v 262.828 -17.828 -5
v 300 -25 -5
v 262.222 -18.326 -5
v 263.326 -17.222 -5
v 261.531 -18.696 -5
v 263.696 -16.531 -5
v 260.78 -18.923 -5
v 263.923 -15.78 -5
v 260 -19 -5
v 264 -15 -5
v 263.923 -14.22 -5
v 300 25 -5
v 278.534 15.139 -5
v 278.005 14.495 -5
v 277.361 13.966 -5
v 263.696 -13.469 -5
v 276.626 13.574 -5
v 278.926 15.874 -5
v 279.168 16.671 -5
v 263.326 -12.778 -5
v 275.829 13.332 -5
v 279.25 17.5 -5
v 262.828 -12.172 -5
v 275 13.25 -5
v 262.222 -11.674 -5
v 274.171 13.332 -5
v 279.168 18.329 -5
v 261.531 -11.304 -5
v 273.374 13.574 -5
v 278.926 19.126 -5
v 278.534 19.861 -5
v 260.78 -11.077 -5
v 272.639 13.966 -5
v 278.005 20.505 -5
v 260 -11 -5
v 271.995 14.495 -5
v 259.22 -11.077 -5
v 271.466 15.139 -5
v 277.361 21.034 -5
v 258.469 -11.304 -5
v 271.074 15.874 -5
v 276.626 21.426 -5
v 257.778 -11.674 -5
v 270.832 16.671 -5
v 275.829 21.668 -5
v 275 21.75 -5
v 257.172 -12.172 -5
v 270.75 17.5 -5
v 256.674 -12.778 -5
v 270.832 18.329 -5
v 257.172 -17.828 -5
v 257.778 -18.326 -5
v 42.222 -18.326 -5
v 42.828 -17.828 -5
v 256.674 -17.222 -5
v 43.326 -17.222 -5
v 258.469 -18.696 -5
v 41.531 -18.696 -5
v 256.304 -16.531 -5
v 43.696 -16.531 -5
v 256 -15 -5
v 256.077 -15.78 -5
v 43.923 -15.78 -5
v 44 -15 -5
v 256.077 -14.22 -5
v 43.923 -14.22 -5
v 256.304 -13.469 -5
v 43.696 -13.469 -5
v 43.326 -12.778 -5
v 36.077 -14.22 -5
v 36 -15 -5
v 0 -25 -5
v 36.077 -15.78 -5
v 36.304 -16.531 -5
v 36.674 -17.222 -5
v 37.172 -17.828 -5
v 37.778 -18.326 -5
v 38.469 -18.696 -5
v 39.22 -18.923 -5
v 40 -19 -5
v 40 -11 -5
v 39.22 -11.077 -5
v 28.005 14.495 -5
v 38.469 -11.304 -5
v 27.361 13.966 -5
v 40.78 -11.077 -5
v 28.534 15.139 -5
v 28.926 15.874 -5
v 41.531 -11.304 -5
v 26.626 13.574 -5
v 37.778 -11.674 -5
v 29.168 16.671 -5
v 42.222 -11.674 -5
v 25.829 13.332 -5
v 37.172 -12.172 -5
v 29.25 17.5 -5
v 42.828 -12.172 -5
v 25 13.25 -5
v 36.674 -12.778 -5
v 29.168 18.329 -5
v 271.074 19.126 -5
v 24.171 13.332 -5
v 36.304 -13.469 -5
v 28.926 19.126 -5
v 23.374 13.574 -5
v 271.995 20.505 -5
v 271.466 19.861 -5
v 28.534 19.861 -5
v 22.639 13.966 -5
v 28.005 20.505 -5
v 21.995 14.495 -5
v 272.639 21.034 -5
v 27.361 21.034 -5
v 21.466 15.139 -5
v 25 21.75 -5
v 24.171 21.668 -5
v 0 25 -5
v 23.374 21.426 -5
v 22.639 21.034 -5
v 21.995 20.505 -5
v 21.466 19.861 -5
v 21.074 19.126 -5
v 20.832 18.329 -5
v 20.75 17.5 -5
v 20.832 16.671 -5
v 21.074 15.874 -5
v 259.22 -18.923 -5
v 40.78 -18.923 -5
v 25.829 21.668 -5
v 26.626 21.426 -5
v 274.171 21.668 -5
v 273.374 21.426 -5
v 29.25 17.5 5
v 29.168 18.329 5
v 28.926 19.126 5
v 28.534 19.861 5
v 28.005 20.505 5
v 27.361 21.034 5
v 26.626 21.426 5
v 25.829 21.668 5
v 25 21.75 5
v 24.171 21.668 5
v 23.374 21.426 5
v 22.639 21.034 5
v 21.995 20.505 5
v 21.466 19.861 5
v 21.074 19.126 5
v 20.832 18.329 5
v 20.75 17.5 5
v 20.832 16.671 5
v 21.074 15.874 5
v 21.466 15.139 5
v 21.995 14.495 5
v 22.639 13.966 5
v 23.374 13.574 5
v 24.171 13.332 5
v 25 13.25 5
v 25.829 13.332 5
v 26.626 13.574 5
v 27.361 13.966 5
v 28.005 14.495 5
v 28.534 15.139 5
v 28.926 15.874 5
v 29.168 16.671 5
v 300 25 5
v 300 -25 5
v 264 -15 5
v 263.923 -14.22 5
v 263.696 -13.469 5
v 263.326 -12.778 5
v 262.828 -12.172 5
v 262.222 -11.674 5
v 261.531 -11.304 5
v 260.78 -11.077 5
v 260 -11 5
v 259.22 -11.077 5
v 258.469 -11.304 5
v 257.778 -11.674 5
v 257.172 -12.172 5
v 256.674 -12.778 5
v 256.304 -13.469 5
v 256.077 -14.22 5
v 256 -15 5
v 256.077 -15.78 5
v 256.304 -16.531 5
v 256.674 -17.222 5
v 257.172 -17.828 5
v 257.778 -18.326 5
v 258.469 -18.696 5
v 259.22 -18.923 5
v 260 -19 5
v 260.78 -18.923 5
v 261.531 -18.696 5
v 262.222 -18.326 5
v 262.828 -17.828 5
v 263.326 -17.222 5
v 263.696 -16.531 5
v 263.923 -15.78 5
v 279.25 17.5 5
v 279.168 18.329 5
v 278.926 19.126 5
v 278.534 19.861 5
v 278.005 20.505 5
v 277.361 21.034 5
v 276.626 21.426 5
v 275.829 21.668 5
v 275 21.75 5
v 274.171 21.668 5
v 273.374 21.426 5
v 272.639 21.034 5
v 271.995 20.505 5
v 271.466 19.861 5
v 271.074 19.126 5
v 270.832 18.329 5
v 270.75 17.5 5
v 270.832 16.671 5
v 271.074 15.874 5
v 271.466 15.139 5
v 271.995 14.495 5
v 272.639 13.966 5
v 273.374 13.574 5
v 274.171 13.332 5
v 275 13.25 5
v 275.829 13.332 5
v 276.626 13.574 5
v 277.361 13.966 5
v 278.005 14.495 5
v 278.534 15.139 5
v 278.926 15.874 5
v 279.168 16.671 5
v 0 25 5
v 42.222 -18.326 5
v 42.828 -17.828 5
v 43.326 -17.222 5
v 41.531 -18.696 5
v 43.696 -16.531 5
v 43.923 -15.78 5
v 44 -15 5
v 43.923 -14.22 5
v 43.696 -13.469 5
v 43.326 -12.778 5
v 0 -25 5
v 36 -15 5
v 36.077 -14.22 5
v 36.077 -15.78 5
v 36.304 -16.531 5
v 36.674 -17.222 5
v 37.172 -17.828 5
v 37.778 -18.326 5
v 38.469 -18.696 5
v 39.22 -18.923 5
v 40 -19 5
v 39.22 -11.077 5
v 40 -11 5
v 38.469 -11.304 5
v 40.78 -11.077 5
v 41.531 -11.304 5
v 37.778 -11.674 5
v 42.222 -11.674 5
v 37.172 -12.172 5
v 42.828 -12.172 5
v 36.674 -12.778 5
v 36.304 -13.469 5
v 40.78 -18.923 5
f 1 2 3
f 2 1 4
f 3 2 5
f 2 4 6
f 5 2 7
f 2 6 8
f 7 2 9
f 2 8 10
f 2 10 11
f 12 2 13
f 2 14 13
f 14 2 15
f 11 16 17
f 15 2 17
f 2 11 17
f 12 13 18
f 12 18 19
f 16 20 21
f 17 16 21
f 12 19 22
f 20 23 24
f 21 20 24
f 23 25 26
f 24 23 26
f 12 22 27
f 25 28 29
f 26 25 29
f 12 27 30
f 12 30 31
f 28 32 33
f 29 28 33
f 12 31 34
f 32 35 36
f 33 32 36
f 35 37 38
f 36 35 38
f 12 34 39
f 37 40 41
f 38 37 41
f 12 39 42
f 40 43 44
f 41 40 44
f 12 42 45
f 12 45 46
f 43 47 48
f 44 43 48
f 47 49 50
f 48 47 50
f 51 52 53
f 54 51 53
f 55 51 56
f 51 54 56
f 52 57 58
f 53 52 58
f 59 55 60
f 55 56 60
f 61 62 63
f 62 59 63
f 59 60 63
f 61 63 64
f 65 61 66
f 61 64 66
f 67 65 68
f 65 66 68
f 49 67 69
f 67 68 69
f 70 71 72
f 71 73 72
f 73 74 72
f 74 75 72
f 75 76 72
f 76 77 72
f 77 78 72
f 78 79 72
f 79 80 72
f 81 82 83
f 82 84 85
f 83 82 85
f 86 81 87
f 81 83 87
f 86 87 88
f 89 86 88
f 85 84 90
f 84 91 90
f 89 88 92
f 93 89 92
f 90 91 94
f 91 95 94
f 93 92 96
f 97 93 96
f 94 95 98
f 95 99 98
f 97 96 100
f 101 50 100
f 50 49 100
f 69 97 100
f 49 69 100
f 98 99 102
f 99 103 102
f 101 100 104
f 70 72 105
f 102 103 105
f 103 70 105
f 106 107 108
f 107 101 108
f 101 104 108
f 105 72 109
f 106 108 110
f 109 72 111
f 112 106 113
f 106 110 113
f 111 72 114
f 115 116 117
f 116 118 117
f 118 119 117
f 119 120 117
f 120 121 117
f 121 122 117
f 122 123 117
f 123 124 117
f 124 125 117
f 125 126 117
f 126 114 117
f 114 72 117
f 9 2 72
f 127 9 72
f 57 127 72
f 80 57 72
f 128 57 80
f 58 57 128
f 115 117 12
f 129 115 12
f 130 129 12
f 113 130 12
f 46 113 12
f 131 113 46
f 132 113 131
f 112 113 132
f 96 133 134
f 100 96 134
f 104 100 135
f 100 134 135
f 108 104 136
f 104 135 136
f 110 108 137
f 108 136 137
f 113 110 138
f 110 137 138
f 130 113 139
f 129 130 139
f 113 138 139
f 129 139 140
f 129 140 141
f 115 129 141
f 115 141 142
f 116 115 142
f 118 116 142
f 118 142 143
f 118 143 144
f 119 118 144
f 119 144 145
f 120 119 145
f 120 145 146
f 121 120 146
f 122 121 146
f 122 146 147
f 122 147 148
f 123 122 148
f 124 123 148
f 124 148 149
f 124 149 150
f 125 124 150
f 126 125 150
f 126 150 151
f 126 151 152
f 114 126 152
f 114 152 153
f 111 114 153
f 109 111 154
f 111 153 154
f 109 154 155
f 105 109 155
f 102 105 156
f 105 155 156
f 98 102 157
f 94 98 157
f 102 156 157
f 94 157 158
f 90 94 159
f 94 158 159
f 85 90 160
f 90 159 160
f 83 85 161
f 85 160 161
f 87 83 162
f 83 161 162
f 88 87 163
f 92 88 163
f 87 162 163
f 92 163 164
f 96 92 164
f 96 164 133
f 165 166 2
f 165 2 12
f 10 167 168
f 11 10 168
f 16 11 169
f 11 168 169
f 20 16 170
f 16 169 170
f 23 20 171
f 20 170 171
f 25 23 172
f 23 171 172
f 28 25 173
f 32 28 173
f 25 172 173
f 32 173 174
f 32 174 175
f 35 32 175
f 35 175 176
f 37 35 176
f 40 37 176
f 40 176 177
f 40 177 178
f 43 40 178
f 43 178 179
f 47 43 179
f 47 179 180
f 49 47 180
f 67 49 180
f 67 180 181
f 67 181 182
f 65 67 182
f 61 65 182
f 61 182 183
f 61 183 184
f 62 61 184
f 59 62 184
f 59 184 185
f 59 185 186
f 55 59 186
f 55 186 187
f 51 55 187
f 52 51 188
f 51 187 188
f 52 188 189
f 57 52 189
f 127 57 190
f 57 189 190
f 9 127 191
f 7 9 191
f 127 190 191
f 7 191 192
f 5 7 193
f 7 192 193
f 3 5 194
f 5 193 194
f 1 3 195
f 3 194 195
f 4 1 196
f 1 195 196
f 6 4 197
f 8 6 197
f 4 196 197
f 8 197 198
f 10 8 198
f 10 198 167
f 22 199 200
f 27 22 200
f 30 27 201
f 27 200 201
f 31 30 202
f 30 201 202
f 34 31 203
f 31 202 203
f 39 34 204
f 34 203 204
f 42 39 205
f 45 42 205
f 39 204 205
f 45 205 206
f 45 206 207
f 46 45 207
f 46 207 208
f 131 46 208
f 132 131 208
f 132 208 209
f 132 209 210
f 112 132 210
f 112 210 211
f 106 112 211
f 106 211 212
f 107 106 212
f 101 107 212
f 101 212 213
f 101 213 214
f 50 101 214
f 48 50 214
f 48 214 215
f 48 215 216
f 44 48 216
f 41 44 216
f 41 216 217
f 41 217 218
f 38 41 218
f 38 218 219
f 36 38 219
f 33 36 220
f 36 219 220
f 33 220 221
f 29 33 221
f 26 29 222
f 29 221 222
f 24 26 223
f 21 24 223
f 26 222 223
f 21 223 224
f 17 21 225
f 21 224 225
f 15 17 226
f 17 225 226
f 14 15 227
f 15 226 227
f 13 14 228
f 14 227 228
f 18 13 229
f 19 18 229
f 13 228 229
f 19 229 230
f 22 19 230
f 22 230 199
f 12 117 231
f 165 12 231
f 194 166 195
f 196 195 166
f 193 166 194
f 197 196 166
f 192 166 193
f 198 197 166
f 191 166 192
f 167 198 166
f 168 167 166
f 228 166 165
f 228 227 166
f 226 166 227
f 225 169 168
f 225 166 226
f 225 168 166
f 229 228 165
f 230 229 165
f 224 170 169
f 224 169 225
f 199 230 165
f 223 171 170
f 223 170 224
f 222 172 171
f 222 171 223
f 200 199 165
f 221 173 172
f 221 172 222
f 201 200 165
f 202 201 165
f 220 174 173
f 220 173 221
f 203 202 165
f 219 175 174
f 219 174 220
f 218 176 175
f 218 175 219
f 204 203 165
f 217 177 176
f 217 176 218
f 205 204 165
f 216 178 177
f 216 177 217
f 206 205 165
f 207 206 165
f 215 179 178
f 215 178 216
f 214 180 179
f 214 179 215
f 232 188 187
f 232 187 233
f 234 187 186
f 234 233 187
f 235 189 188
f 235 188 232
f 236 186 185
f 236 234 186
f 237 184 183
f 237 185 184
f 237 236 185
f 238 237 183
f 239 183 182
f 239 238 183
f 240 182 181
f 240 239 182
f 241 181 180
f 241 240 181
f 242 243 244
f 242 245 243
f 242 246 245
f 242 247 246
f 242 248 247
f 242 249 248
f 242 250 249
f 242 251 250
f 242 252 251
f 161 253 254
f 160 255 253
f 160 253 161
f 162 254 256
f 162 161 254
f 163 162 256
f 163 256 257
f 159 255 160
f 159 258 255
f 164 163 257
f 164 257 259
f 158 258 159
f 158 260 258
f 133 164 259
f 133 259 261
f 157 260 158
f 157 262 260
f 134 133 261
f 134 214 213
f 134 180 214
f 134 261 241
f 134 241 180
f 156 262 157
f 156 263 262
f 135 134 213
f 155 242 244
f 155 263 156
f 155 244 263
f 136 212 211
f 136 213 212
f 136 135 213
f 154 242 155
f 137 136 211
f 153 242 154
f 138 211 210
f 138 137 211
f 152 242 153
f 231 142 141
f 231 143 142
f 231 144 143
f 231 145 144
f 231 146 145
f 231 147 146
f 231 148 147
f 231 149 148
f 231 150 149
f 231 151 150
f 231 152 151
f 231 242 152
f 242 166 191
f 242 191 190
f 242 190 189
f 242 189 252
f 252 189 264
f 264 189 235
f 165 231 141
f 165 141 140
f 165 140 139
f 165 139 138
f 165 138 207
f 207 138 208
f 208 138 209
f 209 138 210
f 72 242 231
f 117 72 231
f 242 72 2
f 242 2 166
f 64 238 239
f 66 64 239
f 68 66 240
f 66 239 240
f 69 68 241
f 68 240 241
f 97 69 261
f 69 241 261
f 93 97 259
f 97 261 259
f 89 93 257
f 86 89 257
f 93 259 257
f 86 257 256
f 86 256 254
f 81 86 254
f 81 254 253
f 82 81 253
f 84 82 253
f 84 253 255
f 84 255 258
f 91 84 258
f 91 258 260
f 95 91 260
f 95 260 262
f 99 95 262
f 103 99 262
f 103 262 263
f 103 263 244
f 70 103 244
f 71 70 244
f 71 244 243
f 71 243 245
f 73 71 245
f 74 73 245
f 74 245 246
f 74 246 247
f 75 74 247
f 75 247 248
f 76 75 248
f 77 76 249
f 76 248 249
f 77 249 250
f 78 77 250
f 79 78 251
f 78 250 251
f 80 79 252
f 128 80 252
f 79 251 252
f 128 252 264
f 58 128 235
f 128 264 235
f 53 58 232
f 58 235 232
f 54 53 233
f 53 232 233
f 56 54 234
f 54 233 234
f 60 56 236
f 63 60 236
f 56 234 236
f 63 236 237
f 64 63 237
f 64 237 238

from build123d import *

# Parameters (mm, degrees)
F0_W     = 50
F0_H     = 10
F1_DEPTH = 300
F2_R     = 4.25
F3_DEPTH = 25
F4_R     = 4
F5_DEPTH = 329


with BuildPart() as f1:
    # F0 (on Right) → F1 (new body)
    with BuildSketch(Plane.YZ):
        Rectangle(F0_W, F0_H)
    extrude(amount=F1_DEPTH)

    # F2 (on face) → F3 (cut)
    with BuildSketch(Plane.XY.offset(5)):
        with Locations((25, 17.5)):
            Circle(F2_R)
        with Locations((275, 17.5)):
            Circle(F2_R)
    extrude(amount=-F3_DEPTH, mode=Mode.SUBTRACT)

    # F4 (on face) → F5 (cut)
    with BuildSketch(Plane.XY.offset(5)):
        with Locations((40, -15)):
            Circle(F4_R)
        with Locations((260, -15)):
            Circle(F4_R)
    extrude(amount=-F5_DEPTH, mode=Mode.SUBTRACT)


solid = f1.part
